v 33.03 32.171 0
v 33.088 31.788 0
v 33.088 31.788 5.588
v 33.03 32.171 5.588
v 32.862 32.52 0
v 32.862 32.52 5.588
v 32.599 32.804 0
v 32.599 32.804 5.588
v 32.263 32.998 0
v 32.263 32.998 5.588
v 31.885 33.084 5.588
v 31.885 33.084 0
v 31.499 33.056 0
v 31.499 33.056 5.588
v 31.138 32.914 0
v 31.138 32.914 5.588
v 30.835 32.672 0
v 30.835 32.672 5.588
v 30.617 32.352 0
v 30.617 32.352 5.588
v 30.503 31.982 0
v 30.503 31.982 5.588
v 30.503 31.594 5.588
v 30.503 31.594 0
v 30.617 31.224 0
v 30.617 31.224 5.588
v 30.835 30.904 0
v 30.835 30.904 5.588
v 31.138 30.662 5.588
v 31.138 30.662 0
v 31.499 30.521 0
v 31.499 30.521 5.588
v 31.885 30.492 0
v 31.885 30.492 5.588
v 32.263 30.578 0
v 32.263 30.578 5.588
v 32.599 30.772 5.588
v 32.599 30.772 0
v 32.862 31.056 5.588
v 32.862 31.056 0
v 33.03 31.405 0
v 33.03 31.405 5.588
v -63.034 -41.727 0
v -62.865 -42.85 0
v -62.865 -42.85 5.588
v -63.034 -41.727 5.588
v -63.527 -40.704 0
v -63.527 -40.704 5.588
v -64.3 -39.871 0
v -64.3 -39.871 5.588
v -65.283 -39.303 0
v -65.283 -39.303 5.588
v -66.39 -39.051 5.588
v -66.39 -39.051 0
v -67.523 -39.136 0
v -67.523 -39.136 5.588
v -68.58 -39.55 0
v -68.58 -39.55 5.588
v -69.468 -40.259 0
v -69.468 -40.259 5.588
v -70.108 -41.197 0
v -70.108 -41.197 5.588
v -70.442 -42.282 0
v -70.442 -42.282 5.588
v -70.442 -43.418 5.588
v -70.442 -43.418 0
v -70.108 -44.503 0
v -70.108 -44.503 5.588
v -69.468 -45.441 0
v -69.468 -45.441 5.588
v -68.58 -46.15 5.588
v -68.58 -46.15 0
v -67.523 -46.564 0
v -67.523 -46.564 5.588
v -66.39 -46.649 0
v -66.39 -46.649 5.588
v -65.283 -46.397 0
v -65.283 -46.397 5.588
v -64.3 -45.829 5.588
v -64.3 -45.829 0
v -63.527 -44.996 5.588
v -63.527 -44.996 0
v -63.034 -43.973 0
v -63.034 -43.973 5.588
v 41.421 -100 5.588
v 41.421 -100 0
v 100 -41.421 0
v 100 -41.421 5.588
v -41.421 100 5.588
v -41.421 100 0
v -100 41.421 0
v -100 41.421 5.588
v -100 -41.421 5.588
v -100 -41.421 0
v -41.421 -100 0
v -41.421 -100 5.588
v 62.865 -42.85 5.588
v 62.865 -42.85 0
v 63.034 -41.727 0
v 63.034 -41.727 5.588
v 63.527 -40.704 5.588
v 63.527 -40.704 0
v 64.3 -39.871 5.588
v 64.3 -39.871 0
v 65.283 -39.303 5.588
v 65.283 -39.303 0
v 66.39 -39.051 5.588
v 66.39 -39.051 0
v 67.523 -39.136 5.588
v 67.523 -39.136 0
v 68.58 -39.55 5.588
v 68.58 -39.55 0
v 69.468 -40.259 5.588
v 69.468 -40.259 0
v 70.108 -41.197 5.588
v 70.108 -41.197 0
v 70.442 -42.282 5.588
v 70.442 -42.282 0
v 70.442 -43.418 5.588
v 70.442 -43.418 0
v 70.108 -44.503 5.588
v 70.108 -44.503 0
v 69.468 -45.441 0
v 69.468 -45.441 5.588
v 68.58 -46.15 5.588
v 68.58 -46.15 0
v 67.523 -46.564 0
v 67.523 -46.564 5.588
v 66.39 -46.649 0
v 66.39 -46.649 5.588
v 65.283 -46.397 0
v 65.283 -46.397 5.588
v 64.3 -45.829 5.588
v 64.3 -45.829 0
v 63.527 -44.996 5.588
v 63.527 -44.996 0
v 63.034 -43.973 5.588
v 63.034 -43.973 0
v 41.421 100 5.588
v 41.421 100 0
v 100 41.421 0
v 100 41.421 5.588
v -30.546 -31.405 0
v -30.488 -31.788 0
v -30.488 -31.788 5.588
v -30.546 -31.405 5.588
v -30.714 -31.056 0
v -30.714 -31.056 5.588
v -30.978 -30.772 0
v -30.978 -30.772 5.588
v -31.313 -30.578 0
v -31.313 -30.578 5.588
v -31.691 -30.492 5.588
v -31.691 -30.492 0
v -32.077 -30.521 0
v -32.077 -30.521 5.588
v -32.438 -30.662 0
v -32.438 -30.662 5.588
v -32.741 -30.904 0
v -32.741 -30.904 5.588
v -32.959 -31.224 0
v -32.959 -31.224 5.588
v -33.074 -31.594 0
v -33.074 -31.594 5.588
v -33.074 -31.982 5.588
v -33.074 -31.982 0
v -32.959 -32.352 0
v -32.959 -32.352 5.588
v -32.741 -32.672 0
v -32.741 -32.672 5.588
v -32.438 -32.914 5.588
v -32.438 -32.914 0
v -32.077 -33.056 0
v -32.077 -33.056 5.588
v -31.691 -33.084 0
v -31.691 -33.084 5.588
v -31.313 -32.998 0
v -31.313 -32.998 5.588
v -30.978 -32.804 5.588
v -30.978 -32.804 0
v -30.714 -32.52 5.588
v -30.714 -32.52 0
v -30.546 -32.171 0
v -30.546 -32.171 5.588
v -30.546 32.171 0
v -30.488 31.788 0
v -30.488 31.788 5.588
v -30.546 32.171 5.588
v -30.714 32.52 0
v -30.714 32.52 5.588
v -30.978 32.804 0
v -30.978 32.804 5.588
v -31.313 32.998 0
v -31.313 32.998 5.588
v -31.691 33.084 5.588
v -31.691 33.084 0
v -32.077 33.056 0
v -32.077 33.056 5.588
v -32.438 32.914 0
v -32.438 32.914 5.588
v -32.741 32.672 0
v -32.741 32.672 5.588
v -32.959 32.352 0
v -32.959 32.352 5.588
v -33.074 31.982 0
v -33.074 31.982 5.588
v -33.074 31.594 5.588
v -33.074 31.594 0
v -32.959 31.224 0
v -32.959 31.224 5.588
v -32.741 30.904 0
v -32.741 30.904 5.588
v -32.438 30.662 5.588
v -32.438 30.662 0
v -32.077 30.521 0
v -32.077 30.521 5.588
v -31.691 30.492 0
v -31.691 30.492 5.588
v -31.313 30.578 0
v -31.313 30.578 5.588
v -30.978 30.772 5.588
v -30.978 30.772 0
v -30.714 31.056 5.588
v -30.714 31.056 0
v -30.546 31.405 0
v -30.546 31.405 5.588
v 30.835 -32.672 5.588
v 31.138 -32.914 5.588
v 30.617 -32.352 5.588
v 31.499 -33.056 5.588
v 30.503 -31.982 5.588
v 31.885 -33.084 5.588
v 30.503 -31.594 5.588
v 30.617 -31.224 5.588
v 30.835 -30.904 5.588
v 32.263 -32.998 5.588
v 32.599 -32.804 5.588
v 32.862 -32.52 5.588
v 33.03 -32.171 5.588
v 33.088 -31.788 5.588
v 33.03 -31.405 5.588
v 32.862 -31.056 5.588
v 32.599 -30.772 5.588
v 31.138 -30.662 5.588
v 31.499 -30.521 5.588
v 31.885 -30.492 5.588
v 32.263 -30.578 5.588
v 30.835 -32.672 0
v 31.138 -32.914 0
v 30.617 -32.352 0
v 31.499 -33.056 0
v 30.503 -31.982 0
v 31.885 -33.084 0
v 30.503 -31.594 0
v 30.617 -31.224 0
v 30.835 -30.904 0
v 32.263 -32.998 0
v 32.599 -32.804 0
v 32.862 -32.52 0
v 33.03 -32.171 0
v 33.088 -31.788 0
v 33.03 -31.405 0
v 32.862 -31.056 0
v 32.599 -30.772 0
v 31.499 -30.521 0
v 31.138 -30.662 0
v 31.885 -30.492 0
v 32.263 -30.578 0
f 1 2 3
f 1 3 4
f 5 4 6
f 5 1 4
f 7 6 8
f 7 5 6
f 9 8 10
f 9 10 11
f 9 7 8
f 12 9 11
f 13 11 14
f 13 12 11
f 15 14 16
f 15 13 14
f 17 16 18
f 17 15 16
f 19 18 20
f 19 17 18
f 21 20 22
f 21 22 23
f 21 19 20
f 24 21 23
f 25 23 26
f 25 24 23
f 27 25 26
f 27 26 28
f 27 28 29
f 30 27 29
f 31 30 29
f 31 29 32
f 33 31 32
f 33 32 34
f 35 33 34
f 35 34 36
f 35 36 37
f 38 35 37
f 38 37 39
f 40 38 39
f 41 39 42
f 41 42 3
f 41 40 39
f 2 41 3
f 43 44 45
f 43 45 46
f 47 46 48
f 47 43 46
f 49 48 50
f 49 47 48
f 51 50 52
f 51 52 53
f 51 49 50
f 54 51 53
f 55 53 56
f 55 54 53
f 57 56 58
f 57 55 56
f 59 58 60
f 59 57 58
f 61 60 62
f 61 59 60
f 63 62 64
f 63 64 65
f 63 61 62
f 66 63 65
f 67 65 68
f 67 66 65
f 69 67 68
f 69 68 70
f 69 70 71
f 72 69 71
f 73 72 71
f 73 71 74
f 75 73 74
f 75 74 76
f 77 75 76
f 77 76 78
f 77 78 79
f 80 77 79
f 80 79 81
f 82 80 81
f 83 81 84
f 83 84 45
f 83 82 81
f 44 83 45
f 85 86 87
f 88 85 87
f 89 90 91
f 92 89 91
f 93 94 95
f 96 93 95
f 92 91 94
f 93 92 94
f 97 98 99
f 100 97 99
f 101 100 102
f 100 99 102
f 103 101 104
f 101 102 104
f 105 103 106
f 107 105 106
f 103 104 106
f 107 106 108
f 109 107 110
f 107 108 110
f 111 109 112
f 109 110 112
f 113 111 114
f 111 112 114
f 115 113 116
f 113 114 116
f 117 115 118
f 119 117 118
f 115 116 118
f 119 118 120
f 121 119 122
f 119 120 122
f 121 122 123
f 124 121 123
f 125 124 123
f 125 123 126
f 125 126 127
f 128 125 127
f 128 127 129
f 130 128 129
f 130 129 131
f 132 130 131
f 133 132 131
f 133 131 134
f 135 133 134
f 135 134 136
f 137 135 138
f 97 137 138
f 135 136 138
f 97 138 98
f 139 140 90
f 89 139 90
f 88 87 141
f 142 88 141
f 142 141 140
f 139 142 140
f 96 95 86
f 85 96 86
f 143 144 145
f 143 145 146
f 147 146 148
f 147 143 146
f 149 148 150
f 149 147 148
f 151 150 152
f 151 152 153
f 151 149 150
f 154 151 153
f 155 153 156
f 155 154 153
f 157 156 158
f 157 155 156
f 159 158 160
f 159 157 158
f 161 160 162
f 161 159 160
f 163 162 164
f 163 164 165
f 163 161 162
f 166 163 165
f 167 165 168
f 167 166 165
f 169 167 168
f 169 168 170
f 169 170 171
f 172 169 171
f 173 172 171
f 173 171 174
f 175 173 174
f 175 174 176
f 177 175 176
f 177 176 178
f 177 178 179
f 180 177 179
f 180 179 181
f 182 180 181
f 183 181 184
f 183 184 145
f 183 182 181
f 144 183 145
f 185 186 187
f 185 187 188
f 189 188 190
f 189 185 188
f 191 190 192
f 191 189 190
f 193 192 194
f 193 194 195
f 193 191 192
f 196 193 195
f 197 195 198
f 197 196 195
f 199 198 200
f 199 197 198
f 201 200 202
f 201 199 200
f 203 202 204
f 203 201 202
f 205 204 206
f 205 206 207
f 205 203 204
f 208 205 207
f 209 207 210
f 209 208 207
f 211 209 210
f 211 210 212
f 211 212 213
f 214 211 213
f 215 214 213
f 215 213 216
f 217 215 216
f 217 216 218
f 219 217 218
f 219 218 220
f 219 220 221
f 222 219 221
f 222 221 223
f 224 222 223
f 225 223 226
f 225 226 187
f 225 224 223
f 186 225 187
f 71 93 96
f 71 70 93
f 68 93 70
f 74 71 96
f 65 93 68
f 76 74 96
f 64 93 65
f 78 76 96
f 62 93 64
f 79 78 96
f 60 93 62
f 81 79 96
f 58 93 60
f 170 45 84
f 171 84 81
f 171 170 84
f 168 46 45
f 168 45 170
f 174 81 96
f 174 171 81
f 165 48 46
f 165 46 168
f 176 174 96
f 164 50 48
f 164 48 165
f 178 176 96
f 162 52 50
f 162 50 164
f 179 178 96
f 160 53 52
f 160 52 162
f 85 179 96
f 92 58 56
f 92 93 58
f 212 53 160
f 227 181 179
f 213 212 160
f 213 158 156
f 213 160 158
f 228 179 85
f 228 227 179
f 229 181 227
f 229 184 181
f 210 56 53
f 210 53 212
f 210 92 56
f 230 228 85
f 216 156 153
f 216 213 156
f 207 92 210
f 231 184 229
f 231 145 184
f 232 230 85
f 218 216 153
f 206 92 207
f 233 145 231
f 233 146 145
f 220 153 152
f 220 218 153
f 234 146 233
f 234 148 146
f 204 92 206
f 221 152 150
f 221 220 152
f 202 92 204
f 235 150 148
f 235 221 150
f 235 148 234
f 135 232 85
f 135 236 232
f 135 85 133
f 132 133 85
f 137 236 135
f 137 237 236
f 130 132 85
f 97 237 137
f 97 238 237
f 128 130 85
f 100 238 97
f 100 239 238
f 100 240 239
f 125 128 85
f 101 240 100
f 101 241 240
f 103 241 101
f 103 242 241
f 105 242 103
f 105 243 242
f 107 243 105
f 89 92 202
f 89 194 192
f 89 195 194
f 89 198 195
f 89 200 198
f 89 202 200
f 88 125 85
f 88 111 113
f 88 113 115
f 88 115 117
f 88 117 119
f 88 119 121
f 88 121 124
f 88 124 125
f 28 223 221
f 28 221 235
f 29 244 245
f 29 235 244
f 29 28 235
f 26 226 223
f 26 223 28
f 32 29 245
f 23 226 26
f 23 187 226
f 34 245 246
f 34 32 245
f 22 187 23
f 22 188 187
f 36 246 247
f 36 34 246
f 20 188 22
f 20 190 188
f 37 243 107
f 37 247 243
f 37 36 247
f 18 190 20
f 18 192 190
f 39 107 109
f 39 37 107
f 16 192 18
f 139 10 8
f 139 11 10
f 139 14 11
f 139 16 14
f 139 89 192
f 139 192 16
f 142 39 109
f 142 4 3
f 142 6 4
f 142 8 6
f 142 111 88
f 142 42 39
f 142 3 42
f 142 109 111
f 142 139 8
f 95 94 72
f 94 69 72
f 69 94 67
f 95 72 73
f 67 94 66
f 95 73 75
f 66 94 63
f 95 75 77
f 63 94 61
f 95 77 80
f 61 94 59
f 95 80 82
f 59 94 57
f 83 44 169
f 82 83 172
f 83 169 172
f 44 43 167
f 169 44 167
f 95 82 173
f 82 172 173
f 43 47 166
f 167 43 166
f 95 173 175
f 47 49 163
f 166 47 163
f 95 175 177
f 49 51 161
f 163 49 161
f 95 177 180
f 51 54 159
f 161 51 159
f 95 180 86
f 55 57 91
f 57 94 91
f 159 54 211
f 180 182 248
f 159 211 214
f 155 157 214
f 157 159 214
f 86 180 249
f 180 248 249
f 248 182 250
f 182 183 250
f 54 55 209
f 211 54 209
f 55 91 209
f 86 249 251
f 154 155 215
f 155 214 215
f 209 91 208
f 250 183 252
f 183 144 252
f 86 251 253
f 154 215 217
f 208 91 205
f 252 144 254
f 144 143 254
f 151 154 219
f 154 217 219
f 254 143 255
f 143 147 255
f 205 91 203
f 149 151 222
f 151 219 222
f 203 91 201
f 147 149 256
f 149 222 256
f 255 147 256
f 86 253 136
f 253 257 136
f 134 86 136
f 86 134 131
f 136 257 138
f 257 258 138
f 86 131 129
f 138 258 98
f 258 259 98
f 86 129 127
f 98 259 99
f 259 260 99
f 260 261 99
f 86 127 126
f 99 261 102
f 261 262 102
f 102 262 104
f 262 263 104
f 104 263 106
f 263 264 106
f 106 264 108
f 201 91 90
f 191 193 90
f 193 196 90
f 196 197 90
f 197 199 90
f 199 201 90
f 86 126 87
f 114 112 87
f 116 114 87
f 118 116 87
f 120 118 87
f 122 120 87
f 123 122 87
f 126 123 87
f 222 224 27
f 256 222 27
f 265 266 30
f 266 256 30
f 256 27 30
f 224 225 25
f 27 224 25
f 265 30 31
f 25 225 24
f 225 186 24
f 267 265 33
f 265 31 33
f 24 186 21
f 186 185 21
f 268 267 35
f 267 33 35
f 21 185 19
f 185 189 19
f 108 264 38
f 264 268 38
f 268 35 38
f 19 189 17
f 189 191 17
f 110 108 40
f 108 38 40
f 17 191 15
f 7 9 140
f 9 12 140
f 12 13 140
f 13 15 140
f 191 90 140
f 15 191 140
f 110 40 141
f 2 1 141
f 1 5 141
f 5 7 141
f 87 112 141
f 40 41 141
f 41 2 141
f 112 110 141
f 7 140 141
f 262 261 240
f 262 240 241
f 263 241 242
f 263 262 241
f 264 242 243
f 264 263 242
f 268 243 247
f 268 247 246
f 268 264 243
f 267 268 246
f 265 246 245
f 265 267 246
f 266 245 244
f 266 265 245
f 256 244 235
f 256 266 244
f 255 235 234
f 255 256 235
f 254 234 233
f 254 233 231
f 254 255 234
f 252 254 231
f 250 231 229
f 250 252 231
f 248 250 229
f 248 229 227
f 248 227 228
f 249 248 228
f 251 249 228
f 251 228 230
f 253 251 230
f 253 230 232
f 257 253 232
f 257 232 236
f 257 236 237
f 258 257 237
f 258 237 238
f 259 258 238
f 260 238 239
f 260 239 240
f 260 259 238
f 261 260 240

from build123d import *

# Parameters (mm, degrees)
F0_R     = 3.81
F0_R_2   = 1.3
F1_DEPTH = 5.588


with BuildPart() as f1:
    # F0 (on Top) → F1 (new body)
    with BuildSketch(Plane.XY):
        Polygon((41.4213562373, 100), (-41.4213562373, 100), (-100, 41.4213562373), (-100, -41.4213562373), (-41.4213562373, -100), (41.4213562373, -100), (100, -41.4213562373), (100, 41.4213562373), align=None)
        with Locations((-66.675, -42.85)):
            Circle(F0_R, mode=Mode.SUBTRACT)
        with Locations((-31.7881, -31.7881)):
            Circle(F0_R_2, mode=Mode.SUBTRACT)
        with Locations((31.7881, -31.7881)):
            Circle(F0_R_2, mode=Mode.SUBTRACT)
        with BuildLine():
            ThreePointArc((70.485, -42.85), (66.675, -46.66), (62.865, -42.85))
            ThreePointArc((62.865, -42.85), (66.675, -39.04), (70.485, -42.85))
        make_face(mode=Mode.SUBTRACT)
        with Locations((-31.7881, 31.7881)):
            Circle(F0_R_2, mode=Mode.SUBTRACT)
        with Locations((31.7881, 31.7881)):
            Circle(F0_R_2, mode=Mode.SUBTRACT)
    extrude(amount=F1_DEPTH)


solid = f1.part
